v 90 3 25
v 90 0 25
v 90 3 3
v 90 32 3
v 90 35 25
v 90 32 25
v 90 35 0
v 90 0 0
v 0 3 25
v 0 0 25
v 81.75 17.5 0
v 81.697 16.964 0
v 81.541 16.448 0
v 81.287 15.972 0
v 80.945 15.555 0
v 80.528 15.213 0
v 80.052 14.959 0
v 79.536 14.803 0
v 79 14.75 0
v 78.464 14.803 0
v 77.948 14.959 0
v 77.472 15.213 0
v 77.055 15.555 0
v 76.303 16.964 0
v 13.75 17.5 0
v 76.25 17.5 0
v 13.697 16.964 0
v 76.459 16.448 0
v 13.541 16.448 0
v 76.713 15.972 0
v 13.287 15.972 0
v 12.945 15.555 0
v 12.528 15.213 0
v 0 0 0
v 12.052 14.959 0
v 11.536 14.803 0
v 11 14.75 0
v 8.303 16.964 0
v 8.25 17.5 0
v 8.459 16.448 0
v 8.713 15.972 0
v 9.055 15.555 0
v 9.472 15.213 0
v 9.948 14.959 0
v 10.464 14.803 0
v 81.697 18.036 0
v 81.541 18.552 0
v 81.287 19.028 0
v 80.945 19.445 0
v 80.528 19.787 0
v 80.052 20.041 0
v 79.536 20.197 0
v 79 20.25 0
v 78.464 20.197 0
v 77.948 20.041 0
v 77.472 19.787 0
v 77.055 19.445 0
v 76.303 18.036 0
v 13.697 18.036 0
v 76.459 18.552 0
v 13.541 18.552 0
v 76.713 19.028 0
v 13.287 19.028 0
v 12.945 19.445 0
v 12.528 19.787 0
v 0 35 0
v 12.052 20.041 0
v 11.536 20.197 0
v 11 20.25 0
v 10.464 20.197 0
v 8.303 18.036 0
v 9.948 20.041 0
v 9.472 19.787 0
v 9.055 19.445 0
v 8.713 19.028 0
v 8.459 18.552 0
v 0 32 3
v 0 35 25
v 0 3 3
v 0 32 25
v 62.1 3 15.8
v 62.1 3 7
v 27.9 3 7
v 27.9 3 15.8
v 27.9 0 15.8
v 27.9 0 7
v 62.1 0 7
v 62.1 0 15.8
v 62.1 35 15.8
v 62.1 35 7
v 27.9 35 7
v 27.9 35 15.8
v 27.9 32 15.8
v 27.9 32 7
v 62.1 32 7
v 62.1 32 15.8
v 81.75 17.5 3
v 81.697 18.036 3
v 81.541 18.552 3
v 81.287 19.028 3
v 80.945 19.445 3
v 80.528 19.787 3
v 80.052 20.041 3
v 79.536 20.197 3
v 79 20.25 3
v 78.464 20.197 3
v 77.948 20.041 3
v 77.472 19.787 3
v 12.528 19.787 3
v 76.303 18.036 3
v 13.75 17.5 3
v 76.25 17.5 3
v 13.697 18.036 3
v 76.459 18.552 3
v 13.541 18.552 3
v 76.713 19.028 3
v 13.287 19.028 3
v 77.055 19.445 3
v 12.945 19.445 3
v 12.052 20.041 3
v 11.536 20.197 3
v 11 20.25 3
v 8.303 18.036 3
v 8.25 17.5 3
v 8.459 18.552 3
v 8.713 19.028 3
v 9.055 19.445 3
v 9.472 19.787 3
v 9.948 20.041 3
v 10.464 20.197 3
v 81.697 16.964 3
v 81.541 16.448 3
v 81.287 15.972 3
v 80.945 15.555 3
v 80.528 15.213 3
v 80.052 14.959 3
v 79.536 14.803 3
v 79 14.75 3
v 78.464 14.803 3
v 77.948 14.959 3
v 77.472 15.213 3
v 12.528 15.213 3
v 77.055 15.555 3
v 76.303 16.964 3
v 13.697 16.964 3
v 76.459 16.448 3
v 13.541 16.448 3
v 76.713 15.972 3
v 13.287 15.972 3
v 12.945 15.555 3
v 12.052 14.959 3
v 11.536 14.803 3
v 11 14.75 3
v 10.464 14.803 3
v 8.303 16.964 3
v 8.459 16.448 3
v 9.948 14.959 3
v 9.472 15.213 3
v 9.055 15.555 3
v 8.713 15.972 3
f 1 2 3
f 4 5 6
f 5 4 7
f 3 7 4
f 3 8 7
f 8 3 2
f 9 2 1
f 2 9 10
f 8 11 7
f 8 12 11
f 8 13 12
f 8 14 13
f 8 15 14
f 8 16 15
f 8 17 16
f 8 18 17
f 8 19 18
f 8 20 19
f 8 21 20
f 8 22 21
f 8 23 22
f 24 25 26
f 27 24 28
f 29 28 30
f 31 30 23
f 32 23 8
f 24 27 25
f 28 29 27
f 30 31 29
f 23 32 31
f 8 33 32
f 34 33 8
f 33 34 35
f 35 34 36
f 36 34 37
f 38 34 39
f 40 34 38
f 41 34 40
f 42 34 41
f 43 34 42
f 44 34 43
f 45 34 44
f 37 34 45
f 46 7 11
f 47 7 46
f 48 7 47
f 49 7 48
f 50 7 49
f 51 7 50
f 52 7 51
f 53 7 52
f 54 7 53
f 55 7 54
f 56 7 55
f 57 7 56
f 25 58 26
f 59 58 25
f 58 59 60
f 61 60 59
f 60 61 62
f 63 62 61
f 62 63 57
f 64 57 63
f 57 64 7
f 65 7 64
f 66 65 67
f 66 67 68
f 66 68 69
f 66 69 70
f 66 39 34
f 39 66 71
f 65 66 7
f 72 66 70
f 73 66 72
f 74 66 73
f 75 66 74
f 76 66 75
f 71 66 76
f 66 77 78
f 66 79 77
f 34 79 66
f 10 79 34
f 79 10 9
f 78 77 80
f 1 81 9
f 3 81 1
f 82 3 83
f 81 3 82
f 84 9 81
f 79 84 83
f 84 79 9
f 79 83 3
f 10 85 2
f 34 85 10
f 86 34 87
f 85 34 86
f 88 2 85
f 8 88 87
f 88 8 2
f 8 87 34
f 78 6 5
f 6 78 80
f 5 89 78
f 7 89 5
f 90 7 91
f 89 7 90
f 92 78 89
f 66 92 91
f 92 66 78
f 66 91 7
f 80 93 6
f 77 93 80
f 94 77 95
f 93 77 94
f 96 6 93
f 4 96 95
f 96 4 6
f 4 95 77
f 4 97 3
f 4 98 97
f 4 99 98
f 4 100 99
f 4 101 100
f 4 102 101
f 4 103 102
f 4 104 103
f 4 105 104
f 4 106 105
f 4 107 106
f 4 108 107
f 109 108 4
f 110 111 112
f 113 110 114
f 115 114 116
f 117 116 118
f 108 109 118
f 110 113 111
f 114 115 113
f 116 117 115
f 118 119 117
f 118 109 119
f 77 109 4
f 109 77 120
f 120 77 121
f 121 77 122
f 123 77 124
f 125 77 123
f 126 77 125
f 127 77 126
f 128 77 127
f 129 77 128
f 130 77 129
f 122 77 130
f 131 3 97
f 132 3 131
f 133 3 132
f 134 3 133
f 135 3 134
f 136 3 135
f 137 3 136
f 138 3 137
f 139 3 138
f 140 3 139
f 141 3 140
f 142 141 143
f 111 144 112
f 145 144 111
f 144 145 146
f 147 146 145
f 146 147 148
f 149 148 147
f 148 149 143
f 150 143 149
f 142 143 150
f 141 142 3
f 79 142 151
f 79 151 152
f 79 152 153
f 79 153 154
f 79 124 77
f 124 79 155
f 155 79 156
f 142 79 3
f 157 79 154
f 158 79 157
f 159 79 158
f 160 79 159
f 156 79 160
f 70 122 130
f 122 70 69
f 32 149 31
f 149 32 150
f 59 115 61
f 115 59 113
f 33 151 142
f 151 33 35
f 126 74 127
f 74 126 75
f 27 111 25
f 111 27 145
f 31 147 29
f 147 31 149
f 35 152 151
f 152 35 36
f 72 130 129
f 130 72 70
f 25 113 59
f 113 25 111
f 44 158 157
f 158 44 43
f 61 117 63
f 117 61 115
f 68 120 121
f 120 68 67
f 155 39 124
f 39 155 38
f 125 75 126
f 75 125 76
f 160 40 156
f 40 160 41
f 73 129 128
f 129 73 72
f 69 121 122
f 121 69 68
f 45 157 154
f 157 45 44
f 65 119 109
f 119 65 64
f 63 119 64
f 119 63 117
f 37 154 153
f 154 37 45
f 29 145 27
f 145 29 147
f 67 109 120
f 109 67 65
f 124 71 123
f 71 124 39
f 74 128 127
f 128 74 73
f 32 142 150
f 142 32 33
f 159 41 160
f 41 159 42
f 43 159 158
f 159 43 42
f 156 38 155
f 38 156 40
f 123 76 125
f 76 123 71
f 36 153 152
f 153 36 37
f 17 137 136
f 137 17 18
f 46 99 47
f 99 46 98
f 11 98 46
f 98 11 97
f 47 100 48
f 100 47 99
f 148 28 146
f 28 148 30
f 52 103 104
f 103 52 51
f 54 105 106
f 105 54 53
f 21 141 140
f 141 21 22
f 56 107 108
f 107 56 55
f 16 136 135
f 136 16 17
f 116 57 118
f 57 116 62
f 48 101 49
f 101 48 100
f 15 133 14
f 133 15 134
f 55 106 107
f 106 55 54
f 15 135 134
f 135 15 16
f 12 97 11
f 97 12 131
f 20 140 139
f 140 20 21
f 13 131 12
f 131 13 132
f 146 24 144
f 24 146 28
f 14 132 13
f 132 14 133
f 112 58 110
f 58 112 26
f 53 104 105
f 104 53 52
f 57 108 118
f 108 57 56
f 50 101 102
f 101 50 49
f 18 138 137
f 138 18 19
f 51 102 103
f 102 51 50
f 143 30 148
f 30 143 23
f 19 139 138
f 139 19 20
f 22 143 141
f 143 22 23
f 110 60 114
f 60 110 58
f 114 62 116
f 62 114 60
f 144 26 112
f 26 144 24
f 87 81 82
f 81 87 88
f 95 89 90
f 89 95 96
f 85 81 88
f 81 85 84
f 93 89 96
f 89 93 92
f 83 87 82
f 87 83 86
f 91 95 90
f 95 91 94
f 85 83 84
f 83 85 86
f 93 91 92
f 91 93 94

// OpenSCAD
$fn = 32;

// ----------------------------------------------------------------------
// U-bracket: 90 x 35 x 25 mm
// ----------------------------------------------------------------------

// --- parameters (mm) ---
span = 90;                // outer length, X
outer_w = 35;             // outer width, Y
wall_h = 25;              // upright height, Z
plate_t = 3;              // wall thickness
hole_d = 5.5;             // clearance for M5
window_l = 34.2;          // window length
window_h = 8.8;           // window height

module hole_z(px, py) {
  translate([px, py, -0.5]) cylinder(h = plate_t + 1, d = hole_d);
}
module hole_y_pz(pz) {
  /* through both uprights along Y */
  translate([0, -0.5, pz]) rotate([-90, 0, 0]) cylinder(h = outer_w + 1, d = hole_d);
}

module base() {
  cube([span, outer_w, plate_t]);
}

module uprights() {
  cube([span, plate_t, wall_h]);
  translate([0, outer_w - plate_t, 0]) cube([span, plate_t, wall_h]);
}

difference() {
  union() {
    base();
    uprights();
  }
  hole_z(11, 17.5);
  hole_z(79, 17.5);
  /* lightening window through both uprights */
  translate([span / 2 - window_l / 2, -1, plate_t + 4])
    cube([window_l, outer_w + 2, window_h]);
}
